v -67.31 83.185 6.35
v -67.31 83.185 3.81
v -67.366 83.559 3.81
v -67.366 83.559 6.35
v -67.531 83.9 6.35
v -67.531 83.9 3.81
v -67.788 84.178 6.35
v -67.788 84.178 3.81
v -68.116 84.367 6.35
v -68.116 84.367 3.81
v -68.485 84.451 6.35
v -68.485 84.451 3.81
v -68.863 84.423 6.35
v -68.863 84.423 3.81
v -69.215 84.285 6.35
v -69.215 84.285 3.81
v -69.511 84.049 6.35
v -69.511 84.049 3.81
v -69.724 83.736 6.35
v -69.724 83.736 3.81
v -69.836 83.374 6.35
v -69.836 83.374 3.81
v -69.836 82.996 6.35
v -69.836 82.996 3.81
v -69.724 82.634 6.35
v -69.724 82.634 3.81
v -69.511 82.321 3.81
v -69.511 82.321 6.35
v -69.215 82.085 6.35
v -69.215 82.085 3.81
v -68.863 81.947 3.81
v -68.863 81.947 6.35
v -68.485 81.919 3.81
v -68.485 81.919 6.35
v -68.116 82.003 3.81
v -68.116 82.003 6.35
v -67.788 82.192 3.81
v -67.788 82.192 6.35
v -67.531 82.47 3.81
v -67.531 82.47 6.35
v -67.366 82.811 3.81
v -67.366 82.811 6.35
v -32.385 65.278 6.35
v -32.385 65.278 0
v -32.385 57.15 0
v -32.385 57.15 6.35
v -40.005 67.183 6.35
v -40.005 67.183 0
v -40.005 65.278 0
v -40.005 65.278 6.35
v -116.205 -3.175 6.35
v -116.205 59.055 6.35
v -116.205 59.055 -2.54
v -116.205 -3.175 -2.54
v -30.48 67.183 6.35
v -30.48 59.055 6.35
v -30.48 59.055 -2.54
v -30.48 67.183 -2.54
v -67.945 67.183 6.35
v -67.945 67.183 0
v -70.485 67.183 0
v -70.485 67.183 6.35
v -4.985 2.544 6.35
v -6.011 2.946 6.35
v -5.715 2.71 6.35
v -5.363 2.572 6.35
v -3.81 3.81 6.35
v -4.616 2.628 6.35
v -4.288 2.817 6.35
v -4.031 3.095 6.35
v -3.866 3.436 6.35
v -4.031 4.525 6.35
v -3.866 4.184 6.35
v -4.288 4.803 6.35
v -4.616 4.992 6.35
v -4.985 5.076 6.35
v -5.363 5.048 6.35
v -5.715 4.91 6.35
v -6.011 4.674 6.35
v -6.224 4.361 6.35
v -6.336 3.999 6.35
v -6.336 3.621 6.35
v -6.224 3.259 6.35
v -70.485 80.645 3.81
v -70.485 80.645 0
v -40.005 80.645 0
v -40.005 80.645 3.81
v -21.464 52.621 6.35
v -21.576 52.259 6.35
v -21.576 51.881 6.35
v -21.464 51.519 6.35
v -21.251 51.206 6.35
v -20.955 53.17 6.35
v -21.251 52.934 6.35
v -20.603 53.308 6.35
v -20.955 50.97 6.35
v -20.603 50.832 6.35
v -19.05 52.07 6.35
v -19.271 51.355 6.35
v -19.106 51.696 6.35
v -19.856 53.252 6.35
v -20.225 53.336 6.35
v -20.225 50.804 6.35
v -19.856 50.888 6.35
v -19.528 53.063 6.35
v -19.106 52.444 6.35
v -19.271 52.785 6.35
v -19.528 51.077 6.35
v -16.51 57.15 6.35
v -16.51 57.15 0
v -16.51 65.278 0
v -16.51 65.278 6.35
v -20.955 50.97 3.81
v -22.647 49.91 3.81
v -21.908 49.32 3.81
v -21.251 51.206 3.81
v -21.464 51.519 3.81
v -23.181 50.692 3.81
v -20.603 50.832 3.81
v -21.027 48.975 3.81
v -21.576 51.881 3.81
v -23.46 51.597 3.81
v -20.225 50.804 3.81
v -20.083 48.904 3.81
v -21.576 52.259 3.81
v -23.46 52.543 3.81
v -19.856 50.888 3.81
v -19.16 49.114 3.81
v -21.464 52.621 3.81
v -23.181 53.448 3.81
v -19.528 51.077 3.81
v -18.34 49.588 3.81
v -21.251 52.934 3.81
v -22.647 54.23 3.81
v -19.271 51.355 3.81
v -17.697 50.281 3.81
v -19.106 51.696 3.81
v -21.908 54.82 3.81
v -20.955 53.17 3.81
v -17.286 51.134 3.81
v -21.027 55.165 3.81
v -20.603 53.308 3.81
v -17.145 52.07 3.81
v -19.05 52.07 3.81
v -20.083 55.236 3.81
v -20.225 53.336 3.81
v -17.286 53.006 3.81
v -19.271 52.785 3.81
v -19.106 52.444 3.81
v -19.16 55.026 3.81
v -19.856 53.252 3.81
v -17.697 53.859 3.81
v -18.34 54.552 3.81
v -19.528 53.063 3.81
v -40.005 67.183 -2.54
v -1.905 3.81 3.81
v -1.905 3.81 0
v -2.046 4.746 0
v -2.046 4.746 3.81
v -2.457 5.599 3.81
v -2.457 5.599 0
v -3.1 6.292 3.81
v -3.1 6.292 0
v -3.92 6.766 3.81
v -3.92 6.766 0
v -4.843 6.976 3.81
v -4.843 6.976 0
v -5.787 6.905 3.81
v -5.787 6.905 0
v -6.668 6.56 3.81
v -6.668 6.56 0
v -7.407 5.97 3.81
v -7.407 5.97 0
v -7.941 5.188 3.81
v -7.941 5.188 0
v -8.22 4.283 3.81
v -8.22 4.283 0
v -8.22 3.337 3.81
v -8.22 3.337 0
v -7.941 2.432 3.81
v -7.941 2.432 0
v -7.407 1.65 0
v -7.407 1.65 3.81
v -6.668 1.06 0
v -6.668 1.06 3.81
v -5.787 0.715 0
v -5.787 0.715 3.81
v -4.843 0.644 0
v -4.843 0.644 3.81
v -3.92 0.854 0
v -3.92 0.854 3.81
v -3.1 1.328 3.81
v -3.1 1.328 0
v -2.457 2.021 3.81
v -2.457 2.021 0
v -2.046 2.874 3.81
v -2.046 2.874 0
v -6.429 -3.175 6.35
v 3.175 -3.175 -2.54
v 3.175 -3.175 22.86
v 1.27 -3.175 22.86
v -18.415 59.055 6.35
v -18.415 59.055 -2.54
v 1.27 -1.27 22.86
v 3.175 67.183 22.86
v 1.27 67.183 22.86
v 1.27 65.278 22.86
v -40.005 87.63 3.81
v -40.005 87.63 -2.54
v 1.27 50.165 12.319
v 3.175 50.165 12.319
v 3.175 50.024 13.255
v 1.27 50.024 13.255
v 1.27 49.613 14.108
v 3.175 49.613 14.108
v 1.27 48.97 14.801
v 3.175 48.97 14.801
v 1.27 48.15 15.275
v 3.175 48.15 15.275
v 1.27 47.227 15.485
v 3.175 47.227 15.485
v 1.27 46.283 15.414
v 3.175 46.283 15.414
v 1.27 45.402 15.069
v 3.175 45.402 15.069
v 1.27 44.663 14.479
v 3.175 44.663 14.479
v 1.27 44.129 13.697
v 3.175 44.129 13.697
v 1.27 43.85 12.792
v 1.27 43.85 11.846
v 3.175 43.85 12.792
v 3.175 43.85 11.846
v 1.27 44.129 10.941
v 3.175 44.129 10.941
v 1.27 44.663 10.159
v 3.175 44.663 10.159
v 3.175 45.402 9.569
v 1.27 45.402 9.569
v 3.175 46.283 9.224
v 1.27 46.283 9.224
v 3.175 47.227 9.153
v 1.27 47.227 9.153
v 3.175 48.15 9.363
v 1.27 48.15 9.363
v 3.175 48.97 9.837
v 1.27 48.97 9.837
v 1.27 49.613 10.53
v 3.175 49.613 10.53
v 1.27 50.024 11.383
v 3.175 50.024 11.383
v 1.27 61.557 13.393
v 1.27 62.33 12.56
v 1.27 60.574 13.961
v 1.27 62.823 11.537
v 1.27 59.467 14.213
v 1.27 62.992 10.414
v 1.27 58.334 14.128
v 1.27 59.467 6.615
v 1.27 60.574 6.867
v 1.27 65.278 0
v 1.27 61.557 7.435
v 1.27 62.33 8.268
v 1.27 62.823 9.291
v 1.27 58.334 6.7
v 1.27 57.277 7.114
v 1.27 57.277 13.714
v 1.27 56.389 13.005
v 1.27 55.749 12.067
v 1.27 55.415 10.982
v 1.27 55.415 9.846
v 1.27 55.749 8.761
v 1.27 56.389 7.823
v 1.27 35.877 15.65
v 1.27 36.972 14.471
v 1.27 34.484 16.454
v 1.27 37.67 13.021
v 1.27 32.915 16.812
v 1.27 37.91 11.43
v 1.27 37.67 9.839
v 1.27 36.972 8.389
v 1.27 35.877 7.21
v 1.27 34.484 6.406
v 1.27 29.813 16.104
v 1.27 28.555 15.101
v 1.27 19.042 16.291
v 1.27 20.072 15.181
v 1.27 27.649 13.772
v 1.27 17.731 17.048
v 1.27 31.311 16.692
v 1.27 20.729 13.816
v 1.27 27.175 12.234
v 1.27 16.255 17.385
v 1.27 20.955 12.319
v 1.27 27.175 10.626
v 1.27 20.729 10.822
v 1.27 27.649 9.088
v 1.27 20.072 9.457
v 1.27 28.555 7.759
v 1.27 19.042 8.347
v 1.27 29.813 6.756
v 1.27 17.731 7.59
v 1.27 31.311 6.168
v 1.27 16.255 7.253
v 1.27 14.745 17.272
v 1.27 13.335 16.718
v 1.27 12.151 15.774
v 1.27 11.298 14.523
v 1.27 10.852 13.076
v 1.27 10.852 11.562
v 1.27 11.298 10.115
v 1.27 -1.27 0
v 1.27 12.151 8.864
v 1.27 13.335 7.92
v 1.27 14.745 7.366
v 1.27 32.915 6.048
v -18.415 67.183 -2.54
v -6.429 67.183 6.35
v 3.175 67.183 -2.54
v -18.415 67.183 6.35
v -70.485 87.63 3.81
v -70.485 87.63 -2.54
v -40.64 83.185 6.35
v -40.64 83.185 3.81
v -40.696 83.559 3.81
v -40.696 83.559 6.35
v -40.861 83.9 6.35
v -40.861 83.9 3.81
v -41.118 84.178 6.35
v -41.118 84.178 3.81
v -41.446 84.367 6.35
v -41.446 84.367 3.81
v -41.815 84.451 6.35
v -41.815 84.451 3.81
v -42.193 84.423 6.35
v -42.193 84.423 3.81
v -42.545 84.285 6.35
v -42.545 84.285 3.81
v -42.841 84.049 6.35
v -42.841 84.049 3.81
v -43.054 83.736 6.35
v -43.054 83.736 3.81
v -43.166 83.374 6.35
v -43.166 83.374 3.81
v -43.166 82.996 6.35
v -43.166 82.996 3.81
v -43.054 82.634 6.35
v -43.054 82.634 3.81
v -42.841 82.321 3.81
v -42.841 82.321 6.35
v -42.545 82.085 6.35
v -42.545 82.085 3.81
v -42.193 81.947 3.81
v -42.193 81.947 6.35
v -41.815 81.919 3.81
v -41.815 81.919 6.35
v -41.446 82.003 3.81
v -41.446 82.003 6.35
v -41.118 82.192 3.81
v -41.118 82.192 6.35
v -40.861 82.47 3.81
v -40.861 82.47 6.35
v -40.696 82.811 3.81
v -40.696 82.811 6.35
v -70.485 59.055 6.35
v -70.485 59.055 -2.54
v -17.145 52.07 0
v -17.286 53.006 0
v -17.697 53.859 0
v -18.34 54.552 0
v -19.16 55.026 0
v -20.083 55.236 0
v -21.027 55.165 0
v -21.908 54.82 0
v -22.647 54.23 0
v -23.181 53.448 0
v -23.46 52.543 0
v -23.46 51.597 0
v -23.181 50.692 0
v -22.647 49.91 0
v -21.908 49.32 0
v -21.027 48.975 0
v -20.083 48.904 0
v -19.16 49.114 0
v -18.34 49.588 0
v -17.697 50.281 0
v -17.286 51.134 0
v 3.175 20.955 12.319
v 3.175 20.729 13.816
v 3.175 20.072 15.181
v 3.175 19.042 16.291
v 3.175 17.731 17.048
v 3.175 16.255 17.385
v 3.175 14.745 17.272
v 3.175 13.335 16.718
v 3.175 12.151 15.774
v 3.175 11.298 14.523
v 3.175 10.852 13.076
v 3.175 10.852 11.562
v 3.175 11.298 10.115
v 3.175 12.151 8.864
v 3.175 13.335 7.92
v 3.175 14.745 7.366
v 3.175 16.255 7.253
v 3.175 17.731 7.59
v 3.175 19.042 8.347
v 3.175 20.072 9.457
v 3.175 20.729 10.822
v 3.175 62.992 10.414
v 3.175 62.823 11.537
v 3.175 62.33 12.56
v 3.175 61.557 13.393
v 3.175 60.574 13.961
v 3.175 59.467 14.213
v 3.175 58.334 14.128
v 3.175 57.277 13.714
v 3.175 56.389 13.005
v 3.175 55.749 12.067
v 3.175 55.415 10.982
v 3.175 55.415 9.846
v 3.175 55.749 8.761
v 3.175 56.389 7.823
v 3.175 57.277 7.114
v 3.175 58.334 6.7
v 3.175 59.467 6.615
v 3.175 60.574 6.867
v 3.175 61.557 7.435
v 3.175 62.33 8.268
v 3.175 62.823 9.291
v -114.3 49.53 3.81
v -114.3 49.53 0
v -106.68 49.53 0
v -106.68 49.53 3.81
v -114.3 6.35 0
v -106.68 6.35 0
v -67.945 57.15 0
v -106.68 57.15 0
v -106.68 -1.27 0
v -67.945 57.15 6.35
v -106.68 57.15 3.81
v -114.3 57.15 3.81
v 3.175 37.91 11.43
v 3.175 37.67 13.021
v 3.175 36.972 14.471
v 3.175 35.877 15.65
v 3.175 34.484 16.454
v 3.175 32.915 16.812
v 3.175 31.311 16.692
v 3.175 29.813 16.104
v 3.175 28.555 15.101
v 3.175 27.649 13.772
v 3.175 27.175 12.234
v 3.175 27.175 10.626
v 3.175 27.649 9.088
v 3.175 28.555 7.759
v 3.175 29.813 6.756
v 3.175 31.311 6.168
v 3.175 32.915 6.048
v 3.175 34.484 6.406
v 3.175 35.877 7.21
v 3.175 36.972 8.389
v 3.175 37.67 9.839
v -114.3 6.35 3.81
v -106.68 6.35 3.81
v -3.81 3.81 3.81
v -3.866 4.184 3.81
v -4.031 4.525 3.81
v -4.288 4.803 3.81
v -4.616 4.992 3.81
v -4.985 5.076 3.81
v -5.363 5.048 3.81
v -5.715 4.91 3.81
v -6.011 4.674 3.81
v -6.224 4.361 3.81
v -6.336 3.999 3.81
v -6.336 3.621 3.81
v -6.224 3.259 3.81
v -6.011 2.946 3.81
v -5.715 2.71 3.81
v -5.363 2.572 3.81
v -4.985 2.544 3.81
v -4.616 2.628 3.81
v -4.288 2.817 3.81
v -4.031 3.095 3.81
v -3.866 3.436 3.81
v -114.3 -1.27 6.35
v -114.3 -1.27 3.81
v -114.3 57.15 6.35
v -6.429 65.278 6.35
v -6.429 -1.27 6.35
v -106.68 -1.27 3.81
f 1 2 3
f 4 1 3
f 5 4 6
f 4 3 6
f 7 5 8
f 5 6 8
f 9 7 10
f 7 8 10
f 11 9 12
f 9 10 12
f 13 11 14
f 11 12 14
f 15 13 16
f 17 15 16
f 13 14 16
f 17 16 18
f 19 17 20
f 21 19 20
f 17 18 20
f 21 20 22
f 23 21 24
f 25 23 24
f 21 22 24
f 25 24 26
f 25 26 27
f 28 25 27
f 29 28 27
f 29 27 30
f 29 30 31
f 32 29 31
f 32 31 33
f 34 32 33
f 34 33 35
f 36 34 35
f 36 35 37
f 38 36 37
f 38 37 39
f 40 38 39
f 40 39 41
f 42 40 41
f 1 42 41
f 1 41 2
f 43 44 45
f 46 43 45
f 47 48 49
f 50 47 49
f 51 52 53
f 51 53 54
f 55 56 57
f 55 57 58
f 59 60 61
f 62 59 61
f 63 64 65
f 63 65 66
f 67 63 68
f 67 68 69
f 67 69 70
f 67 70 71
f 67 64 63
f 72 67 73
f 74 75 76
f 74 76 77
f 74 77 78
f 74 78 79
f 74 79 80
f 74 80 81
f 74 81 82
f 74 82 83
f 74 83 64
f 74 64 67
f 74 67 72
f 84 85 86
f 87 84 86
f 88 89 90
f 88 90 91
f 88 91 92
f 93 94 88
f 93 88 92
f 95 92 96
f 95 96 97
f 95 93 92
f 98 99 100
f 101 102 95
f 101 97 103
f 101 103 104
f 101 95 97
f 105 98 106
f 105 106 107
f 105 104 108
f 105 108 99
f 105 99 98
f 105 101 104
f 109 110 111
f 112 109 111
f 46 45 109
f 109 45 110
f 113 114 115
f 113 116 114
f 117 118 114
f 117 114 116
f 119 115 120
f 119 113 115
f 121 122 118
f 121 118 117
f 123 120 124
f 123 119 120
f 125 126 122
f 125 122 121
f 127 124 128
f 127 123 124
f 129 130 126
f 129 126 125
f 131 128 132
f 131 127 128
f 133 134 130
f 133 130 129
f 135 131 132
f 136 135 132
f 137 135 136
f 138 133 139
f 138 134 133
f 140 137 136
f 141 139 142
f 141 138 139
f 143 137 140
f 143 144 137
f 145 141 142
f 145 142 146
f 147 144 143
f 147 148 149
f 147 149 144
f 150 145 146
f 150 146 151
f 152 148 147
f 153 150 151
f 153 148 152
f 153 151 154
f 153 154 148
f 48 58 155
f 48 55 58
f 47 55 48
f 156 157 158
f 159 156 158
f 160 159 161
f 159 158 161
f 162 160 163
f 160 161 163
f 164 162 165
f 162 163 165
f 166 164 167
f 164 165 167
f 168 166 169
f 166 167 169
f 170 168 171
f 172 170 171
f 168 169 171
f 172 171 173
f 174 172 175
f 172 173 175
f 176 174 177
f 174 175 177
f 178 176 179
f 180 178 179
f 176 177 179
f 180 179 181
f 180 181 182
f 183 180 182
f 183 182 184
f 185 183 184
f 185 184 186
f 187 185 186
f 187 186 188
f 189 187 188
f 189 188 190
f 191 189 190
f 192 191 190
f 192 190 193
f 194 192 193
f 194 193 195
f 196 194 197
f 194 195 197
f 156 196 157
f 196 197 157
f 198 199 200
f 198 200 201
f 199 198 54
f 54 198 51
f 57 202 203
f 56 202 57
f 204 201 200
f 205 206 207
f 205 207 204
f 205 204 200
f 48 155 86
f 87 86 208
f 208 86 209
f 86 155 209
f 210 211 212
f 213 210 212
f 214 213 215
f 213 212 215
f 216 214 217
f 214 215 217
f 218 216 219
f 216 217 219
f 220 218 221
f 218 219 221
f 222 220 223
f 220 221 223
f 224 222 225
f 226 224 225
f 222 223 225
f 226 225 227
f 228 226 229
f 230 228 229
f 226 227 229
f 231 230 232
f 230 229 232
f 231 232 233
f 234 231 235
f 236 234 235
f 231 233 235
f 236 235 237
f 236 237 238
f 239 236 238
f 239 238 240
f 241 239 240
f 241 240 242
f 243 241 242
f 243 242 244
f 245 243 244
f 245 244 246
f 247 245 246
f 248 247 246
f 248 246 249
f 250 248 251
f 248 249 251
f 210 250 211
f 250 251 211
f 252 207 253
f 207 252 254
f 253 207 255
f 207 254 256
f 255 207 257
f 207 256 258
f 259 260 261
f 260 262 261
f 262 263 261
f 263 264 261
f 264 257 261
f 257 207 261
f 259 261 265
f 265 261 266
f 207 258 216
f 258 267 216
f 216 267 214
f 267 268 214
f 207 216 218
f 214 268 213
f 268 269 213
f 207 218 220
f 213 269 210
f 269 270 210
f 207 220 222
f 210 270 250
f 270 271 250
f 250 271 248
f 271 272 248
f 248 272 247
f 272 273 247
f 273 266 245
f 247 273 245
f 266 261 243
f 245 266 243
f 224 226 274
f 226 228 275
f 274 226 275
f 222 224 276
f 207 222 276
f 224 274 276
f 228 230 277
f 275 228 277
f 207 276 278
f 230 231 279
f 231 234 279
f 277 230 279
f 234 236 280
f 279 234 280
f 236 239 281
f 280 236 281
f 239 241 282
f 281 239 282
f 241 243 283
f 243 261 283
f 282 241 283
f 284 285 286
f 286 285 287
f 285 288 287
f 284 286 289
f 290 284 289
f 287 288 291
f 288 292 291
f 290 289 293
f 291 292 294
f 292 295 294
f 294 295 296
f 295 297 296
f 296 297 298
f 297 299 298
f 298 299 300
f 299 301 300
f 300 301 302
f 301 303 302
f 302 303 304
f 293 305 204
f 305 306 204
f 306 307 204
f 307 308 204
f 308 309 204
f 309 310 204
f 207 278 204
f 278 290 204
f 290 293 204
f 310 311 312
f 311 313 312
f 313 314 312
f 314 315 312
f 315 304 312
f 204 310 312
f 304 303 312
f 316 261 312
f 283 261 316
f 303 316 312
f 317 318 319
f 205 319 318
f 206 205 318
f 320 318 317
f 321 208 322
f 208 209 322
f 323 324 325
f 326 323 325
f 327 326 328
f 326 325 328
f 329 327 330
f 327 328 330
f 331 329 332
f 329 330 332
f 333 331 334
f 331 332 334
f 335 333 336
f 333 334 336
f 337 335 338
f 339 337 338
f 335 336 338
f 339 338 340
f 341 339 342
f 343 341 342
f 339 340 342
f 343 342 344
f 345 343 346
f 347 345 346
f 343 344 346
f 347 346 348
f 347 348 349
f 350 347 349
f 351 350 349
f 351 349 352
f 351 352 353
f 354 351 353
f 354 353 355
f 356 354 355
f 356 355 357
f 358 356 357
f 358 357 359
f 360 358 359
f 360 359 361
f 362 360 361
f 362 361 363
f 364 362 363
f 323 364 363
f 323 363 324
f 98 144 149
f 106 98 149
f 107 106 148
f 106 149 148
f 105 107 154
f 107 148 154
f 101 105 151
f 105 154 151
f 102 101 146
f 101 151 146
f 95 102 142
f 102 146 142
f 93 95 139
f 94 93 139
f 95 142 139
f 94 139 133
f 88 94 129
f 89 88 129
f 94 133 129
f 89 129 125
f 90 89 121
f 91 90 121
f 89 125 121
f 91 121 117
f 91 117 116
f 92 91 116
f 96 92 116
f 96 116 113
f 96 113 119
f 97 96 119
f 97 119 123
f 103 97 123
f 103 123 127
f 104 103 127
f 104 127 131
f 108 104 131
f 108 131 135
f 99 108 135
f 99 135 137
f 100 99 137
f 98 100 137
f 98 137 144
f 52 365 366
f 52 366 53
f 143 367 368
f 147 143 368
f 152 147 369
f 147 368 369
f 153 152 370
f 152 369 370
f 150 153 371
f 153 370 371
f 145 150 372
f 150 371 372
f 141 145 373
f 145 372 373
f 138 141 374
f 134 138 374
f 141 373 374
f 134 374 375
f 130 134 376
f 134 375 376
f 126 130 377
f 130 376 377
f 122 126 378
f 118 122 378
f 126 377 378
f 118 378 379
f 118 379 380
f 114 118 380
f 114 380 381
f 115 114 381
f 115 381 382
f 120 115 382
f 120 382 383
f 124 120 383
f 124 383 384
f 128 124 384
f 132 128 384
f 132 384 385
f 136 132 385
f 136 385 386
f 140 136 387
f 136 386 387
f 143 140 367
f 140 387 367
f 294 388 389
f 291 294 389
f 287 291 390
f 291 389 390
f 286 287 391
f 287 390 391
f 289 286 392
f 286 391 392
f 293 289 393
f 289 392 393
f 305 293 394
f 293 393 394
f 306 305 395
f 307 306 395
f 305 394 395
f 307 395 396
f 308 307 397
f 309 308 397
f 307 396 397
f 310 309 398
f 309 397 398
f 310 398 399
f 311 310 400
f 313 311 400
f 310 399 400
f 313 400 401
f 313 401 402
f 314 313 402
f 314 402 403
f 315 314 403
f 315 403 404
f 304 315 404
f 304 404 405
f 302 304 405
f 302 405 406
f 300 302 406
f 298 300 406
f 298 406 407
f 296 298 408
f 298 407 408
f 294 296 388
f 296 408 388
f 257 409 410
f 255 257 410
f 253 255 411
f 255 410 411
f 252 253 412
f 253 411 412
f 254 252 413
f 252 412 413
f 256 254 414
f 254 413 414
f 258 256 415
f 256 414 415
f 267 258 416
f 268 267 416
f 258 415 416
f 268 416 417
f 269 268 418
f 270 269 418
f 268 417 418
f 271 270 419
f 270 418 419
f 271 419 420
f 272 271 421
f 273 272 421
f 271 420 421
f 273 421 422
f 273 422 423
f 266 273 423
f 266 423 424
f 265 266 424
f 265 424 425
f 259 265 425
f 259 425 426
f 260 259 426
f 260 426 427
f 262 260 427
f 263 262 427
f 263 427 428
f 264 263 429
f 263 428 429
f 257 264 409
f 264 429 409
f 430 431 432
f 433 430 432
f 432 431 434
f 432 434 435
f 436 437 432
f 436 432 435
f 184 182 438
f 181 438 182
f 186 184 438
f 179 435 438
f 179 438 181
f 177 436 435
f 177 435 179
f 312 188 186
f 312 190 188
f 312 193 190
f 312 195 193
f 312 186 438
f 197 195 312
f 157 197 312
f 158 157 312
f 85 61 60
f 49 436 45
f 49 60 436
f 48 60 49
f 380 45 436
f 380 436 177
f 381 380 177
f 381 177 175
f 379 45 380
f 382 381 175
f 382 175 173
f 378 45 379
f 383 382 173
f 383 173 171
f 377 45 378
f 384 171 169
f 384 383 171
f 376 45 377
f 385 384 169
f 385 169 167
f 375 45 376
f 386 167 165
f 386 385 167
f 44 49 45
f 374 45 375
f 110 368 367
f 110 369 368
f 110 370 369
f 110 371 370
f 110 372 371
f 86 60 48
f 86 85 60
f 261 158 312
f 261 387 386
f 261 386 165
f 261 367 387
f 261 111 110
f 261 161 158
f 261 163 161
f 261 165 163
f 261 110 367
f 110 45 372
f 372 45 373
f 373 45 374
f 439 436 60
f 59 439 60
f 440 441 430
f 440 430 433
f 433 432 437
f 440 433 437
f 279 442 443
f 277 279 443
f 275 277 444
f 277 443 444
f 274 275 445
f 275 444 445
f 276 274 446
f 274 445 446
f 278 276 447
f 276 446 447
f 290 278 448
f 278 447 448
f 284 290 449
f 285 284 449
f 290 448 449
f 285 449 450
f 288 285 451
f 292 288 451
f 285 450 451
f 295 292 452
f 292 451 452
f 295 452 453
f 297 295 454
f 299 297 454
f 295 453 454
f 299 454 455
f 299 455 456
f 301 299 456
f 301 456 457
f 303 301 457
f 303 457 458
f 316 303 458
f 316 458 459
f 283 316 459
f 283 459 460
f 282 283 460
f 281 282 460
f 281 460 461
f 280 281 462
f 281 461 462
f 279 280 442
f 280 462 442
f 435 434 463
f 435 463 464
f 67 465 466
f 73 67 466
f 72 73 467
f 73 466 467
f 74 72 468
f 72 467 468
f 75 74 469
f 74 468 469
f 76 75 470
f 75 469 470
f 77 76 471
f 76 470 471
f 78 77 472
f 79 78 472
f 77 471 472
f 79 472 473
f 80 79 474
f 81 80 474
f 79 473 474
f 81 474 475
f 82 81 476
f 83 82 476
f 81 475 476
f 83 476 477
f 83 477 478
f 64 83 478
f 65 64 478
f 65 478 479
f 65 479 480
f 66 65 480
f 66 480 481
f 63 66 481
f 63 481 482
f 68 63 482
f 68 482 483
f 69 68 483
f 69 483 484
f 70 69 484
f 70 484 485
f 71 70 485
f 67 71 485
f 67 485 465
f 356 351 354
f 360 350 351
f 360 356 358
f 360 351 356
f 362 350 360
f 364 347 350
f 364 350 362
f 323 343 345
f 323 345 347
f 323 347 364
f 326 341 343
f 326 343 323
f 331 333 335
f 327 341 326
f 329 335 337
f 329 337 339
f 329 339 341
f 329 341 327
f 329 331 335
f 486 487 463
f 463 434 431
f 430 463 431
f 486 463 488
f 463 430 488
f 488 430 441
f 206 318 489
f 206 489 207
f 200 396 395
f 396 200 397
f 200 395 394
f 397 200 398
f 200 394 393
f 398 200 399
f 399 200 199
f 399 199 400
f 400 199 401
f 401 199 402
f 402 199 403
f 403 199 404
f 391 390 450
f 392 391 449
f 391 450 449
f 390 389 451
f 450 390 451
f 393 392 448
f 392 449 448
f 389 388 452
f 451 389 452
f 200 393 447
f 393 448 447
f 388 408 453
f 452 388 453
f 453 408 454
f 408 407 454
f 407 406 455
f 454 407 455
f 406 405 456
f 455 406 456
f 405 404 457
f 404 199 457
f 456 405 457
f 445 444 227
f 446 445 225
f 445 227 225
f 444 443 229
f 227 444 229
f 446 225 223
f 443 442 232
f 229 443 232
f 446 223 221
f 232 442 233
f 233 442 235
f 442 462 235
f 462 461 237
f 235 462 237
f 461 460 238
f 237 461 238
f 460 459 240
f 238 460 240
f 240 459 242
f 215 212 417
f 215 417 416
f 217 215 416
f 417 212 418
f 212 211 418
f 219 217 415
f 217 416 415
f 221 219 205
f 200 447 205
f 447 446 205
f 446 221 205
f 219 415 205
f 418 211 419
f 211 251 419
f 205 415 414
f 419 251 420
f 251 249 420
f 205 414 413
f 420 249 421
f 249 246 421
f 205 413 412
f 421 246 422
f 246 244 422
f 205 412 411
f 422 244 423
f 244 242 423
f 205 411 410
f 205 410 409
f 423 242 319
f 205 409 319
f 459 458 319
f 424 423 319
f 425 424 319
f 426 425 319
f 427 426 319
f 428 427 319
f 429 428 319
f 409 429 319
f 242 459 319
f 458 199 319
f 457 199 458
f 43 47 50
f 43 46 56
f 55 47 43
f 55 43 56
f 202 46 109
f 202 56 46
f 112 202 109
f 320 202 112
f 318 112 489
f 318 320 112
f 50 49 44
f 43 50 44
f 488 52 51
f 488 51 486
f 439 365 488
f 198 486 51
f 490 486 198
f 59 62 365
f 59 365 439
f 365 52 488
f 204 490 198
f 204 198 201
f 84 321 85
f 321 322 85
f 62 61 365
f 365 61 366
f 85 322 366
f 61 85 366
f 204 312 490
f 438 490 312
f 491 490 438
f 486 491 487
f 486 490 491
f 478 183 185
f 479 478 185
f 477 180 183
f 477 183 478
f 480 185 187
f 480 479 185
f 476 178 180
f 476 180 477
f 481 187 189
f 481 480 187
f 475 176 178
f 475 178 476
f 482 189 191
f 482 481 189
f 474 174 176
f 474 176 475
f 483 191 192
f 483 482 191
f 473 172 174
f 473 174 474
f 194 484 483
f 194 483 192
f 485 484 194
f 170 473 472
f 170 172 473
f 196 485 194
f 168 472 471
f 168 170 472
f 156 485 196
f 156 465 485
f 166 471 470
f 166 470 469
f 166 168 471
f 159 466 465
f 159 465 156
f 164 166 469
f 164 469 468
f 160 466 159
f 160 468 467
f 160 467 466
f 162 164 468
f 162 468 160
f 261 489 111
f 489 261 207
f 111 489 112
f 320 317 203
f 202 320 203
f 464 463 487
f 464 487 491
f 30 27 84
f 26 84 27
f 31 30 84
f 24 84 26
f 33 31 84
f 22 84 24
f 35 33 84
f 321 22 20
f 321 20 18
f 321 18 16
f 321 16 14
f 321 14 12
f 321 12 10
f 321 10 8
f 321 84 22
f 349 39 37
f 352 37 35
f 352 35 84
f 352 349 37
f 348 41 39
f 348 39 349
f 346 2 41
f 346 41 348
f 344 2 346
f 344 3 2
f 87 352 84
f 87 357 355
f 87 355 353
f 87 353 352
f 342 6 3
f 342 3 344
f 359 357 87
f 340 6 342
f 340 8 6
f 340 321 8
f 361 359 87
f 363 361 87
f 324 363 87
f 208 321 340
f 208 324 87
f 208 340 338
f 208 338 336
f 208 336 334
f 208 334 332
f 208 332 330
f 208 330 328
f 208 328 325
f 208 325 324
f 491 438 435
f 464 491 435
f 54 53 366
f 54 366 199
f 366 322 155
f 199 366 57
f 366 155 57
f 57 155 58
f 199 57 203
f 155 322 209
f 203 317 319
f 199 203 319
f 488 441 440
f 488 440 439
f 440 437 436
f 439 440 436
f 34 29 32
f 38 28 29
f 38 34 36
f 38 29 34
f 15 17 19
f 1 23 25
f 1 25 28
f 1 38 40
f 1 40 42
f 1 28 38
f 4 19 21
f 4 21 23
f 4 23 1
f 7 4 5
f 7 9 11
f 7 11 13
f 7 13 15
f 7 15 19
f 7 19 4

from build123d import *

# Parameters (mm, degrees)
F0_R     = 3.175
F0_W     = 7.62
F0_H     = 7.62
F0_R_2   = 1.27
F0_W_2   = 2.54
F0_H_2   = 13.462
F1_DEPTH = 2.54
F2_DEPTH = 3.81
F3_DEPTH = 6.35
F4_DEPTH = 22.86
F5_R     = 5.08
F5_R_2   = 5.3975
F5_R_3   = 3.175
F5_R_4   = 3.81
F6_DEPTH = 1.905
F8_DEPTH = 1.905
F9_START = -68.453
F9_DEPTH = 1.905


with BuildPart() as f1:
    # F0 (on Top) → F1 (new body)
    with BuildSketch(Plane.XY):
        Polygon((-32.385, 65.278), (-32.385, 57.15), (-16.51, 57.15), (-16.51, 65.278), (1.27, 65.278), (1.27, 67.183), (-18.415, 67.183), (-18.415, 59.055), (-30.48, 59.055), (-30.48, 67.183), (-40.005, 67.183), (-40.005, 65.278), align=None)
        Polygon((-16.51, 57.15), (-32.385, 57.15), (-32.385, 65.278), (-40.005, 65.278), (-43.18, 65.278), (-43.18, 80.645), (-67.945, 80.645), (-67.945, 67.183), (-67.945, 57.15), (-106.68, 57.15), (-106.68, 49.53), (-114.3, 49.53), (-114.3, 6.35), (-106.68, 6.35), (-106.68, -1.27), (1.27, -1.27), (1.27, 65.278), (-16.51, 65.278), align=None)
        with Locations((-5.08, 3.81)):
            Circle(F0_R, mode=Mode.SUBTRACT)
        with Locations((-20.32, 52.07)):
            Circle(F0_R, mode=Mode.SUBTRACT)
        with Locations((-110.49, 53.34)):
            Rectangle(F0_W, F0_H)
        with Locations((-110.49, 2.54)):
            Rectangle(F0_W, F0_H)
        Polygon((-67.945, 80.645), (-43.18, 80.645), (-40.005, 80.645), (-40.005, 87.63), (-70.485, 87.63), (-70.485, 80.645), align=None)
        with Locations((-68.58, 83.185)):
            Circle(F0_R_2, mode=Mode.SUBTRACT)
        with Locations((-41.91, 83.185)):
            Circle(F0_R_2, mode=Mode.SUBTRACT)
        with Locations((-68.58, 83.185)):
            Circle(F0_R_2)
        with Locations((-41.91, 83.185)):
            Circle(F0_R_2)
        with Locations((-20.32, 52.07)):
            Circle(F0_R)
        with Locations((-20.32, 52.07)):
            Circle(F0_R_2, mode=Mode.SUBTRACT)
        with Locations((-20.32, 52.07)):
            Circle(F0_R_2)
        with Locations((-5.08, 3.81)):
            Circle(F0_R)
        with Locations((-5.08, 3.81)):
            Circle(F0_R_2, mode=Mode.SUBTRACT)
        with Locations((-5.08, 3.81)):
            Circle(F0_R_2)
        Polygon((1.27, -3.175), (1.27, -1.27), (-106.68, -1.27), (-114.3, -1.27), (-114.3, 6.35), (-114.3, 49.53), (-114.3, 57.15), (-106.68, 57.15), (-67.945, 57.15), (-67.945, 67.183), (-70.485, 67.183), (-70.485, 59.055), (-116.205, 59.055), (-116.205, -3.175), align=None)
        Polygon((1.27, 67.183), (1.27, 65.278), (1.27, -1.27), (1.27, -3.175), (3.175, -3.175), (3.175, 67.183), align=None)
        with Locations((-69.215, 73.914)):
            Rectangle(F0_W_2, F0_H_2)
        Polygon((-43.18, 65.278), (-40.005, 65.278), (-40.005, 67.183), (-40.005, 80.645), (-43.18, 80.645), align=None)
    extrude(amount=-F1_DEPTH)

    # F0 (on Top) → F2 (join)
    with BuildSketch(Plane.XY):
        Polygon((-67.945, 80.645), (-43.18, 80.645), (-40.005, 80.645), (-40.005, 87.63), (-70.485, 87.63), (-70.485, 80.645), align=None)
        with Locations((-68.58, 83.185)):
            Circle(F0_R_2, mode=Mode.SUBTRACT)
        with Locations((-41.91, 83.185)):
            Circle(F0_R_2, mode=Mode.SUBTRACT)
        with Locations((-110.49, 53.34)):
            Rectangle(F0_W, F0_H)
        with Locations((-110.49, 2.54)):
            Rectangle(F0_W, F0_H)
        with Locations((-20.32, 52.07)):
            Circle(F0_R)
        with Locations((-20.32, 52.07)):
            Circle(F0_R_2, mode=Mode.SUBTRACT)
        with Locations((-5.08, 3.81)):
            Circle(F0_R)
        with Locations((-5.08, 3.81)):
            Circle(F0_R_2, mode=Mode.SUBTRACT)
        with Locations((-68.58, 83.185)):
            Circle(F0_R_2)
        with Locations((-41.91, 83.185)):
            Circle(F0_R_2)
        with Locations((-20.32, 52.07)):
            Circle(F0_R_2)
        with Locations((-5.08, 3.81)):
            Circle(F0_R_2)
    extrude(amount=F2_DEPTH)

    # F0 (on Top) → F3 (join)
    with BuildSketch(Plane.XY):
        with Locations((-68.58, 83.185)):
            Circle(F0_R_2)
        with Locations((-41.91, 83.185)):
            Circle(F0_R_2)
        with Locations((-20.32, 52.07)):
            Circle(F0_R_2)
        with Locations((-5.08, 3.81)):
            Circle(F0_R_2)
        Polygon((1.27, -3.175), (1.27, -1.27), (-106.68, -1.27), (-114.3, -1.27), (-114.3, 6.35), (-114.3, 49.53), (-114.3, 57.15), (-106.68, 57.15), (-67.945, 57.15), (-67.945, 67.183), (-70.485, 67.183), (-70.485, 59.055), (-116.205, 59.055), (-116.205, -3.175), align=None)
        Polygon((-32.385, 65.278), (-32.385, 57.15), (-16.51, 57.15), (-16.51, 65.278), (1.27, 65.278), (1.27, 67.183), (-18.415, 67.183), (-18.415, 59.055), (-30.48, 59.055), (-30.48, 67.183), (-40.005, 67.183), (-40.005, 65.278), align=None)
    extrude(amount=F3_DEPTH)

    # F0 (on Top) → F4 (join)
    with BuildSketch(Plane.XY):
        Polygon((1.27, 67.183), (1.27, 65.278), (1.27, -1.27), (1.27, -3.175), (3.175, -3.175), (3.175, 67.183), align=None)
    extrude(amount=F4_DEPTH)

    # F5 (on face) → F6 (cut, through all)
    with BuildSketch(Plane.YZ.offset(3.175)):
        with Locations((15.875, 12.319)):
            Circle(F5_R)
        with Locations((32.512, 11.43)):
            Circle(F5_R_2)
        with Locations((46.99, 12.319)):
            Circle(F5_R_3)
        with Locations((59.182, 10.414)):
            Circle(F5_R_4)
    extrude(amount=-F6_DEPTH, mode=Mode.SUBTRACT)

    # F7 (on face) → F8 (join, through all)
    with BuildSketch(Plane(origin=(0, 67.183, 0), x_dir=(-1, 0, 0), z_dir=(0, 1, 0))):
        Polygon((6.4287394361, 6.35), (-1.27, 22.86), (-1.27, 6.35), align=None)
    extrude(amount=-F8_DEPTH)

    # F7 (on face) → F9 (join)
    with BuildSketch(Plane(origin=(0, 67.183, 0), x_dir=(-1, 0, 0), z_dir=(0, 1, 0)).offset(F9_START)):
        Polygon((6.4287394361, 6.35), (-1.27, 22.86), (-1.27, 6.35), align=None)
    extrude(amount=-F9_DEPTH)


solid = f1.part
